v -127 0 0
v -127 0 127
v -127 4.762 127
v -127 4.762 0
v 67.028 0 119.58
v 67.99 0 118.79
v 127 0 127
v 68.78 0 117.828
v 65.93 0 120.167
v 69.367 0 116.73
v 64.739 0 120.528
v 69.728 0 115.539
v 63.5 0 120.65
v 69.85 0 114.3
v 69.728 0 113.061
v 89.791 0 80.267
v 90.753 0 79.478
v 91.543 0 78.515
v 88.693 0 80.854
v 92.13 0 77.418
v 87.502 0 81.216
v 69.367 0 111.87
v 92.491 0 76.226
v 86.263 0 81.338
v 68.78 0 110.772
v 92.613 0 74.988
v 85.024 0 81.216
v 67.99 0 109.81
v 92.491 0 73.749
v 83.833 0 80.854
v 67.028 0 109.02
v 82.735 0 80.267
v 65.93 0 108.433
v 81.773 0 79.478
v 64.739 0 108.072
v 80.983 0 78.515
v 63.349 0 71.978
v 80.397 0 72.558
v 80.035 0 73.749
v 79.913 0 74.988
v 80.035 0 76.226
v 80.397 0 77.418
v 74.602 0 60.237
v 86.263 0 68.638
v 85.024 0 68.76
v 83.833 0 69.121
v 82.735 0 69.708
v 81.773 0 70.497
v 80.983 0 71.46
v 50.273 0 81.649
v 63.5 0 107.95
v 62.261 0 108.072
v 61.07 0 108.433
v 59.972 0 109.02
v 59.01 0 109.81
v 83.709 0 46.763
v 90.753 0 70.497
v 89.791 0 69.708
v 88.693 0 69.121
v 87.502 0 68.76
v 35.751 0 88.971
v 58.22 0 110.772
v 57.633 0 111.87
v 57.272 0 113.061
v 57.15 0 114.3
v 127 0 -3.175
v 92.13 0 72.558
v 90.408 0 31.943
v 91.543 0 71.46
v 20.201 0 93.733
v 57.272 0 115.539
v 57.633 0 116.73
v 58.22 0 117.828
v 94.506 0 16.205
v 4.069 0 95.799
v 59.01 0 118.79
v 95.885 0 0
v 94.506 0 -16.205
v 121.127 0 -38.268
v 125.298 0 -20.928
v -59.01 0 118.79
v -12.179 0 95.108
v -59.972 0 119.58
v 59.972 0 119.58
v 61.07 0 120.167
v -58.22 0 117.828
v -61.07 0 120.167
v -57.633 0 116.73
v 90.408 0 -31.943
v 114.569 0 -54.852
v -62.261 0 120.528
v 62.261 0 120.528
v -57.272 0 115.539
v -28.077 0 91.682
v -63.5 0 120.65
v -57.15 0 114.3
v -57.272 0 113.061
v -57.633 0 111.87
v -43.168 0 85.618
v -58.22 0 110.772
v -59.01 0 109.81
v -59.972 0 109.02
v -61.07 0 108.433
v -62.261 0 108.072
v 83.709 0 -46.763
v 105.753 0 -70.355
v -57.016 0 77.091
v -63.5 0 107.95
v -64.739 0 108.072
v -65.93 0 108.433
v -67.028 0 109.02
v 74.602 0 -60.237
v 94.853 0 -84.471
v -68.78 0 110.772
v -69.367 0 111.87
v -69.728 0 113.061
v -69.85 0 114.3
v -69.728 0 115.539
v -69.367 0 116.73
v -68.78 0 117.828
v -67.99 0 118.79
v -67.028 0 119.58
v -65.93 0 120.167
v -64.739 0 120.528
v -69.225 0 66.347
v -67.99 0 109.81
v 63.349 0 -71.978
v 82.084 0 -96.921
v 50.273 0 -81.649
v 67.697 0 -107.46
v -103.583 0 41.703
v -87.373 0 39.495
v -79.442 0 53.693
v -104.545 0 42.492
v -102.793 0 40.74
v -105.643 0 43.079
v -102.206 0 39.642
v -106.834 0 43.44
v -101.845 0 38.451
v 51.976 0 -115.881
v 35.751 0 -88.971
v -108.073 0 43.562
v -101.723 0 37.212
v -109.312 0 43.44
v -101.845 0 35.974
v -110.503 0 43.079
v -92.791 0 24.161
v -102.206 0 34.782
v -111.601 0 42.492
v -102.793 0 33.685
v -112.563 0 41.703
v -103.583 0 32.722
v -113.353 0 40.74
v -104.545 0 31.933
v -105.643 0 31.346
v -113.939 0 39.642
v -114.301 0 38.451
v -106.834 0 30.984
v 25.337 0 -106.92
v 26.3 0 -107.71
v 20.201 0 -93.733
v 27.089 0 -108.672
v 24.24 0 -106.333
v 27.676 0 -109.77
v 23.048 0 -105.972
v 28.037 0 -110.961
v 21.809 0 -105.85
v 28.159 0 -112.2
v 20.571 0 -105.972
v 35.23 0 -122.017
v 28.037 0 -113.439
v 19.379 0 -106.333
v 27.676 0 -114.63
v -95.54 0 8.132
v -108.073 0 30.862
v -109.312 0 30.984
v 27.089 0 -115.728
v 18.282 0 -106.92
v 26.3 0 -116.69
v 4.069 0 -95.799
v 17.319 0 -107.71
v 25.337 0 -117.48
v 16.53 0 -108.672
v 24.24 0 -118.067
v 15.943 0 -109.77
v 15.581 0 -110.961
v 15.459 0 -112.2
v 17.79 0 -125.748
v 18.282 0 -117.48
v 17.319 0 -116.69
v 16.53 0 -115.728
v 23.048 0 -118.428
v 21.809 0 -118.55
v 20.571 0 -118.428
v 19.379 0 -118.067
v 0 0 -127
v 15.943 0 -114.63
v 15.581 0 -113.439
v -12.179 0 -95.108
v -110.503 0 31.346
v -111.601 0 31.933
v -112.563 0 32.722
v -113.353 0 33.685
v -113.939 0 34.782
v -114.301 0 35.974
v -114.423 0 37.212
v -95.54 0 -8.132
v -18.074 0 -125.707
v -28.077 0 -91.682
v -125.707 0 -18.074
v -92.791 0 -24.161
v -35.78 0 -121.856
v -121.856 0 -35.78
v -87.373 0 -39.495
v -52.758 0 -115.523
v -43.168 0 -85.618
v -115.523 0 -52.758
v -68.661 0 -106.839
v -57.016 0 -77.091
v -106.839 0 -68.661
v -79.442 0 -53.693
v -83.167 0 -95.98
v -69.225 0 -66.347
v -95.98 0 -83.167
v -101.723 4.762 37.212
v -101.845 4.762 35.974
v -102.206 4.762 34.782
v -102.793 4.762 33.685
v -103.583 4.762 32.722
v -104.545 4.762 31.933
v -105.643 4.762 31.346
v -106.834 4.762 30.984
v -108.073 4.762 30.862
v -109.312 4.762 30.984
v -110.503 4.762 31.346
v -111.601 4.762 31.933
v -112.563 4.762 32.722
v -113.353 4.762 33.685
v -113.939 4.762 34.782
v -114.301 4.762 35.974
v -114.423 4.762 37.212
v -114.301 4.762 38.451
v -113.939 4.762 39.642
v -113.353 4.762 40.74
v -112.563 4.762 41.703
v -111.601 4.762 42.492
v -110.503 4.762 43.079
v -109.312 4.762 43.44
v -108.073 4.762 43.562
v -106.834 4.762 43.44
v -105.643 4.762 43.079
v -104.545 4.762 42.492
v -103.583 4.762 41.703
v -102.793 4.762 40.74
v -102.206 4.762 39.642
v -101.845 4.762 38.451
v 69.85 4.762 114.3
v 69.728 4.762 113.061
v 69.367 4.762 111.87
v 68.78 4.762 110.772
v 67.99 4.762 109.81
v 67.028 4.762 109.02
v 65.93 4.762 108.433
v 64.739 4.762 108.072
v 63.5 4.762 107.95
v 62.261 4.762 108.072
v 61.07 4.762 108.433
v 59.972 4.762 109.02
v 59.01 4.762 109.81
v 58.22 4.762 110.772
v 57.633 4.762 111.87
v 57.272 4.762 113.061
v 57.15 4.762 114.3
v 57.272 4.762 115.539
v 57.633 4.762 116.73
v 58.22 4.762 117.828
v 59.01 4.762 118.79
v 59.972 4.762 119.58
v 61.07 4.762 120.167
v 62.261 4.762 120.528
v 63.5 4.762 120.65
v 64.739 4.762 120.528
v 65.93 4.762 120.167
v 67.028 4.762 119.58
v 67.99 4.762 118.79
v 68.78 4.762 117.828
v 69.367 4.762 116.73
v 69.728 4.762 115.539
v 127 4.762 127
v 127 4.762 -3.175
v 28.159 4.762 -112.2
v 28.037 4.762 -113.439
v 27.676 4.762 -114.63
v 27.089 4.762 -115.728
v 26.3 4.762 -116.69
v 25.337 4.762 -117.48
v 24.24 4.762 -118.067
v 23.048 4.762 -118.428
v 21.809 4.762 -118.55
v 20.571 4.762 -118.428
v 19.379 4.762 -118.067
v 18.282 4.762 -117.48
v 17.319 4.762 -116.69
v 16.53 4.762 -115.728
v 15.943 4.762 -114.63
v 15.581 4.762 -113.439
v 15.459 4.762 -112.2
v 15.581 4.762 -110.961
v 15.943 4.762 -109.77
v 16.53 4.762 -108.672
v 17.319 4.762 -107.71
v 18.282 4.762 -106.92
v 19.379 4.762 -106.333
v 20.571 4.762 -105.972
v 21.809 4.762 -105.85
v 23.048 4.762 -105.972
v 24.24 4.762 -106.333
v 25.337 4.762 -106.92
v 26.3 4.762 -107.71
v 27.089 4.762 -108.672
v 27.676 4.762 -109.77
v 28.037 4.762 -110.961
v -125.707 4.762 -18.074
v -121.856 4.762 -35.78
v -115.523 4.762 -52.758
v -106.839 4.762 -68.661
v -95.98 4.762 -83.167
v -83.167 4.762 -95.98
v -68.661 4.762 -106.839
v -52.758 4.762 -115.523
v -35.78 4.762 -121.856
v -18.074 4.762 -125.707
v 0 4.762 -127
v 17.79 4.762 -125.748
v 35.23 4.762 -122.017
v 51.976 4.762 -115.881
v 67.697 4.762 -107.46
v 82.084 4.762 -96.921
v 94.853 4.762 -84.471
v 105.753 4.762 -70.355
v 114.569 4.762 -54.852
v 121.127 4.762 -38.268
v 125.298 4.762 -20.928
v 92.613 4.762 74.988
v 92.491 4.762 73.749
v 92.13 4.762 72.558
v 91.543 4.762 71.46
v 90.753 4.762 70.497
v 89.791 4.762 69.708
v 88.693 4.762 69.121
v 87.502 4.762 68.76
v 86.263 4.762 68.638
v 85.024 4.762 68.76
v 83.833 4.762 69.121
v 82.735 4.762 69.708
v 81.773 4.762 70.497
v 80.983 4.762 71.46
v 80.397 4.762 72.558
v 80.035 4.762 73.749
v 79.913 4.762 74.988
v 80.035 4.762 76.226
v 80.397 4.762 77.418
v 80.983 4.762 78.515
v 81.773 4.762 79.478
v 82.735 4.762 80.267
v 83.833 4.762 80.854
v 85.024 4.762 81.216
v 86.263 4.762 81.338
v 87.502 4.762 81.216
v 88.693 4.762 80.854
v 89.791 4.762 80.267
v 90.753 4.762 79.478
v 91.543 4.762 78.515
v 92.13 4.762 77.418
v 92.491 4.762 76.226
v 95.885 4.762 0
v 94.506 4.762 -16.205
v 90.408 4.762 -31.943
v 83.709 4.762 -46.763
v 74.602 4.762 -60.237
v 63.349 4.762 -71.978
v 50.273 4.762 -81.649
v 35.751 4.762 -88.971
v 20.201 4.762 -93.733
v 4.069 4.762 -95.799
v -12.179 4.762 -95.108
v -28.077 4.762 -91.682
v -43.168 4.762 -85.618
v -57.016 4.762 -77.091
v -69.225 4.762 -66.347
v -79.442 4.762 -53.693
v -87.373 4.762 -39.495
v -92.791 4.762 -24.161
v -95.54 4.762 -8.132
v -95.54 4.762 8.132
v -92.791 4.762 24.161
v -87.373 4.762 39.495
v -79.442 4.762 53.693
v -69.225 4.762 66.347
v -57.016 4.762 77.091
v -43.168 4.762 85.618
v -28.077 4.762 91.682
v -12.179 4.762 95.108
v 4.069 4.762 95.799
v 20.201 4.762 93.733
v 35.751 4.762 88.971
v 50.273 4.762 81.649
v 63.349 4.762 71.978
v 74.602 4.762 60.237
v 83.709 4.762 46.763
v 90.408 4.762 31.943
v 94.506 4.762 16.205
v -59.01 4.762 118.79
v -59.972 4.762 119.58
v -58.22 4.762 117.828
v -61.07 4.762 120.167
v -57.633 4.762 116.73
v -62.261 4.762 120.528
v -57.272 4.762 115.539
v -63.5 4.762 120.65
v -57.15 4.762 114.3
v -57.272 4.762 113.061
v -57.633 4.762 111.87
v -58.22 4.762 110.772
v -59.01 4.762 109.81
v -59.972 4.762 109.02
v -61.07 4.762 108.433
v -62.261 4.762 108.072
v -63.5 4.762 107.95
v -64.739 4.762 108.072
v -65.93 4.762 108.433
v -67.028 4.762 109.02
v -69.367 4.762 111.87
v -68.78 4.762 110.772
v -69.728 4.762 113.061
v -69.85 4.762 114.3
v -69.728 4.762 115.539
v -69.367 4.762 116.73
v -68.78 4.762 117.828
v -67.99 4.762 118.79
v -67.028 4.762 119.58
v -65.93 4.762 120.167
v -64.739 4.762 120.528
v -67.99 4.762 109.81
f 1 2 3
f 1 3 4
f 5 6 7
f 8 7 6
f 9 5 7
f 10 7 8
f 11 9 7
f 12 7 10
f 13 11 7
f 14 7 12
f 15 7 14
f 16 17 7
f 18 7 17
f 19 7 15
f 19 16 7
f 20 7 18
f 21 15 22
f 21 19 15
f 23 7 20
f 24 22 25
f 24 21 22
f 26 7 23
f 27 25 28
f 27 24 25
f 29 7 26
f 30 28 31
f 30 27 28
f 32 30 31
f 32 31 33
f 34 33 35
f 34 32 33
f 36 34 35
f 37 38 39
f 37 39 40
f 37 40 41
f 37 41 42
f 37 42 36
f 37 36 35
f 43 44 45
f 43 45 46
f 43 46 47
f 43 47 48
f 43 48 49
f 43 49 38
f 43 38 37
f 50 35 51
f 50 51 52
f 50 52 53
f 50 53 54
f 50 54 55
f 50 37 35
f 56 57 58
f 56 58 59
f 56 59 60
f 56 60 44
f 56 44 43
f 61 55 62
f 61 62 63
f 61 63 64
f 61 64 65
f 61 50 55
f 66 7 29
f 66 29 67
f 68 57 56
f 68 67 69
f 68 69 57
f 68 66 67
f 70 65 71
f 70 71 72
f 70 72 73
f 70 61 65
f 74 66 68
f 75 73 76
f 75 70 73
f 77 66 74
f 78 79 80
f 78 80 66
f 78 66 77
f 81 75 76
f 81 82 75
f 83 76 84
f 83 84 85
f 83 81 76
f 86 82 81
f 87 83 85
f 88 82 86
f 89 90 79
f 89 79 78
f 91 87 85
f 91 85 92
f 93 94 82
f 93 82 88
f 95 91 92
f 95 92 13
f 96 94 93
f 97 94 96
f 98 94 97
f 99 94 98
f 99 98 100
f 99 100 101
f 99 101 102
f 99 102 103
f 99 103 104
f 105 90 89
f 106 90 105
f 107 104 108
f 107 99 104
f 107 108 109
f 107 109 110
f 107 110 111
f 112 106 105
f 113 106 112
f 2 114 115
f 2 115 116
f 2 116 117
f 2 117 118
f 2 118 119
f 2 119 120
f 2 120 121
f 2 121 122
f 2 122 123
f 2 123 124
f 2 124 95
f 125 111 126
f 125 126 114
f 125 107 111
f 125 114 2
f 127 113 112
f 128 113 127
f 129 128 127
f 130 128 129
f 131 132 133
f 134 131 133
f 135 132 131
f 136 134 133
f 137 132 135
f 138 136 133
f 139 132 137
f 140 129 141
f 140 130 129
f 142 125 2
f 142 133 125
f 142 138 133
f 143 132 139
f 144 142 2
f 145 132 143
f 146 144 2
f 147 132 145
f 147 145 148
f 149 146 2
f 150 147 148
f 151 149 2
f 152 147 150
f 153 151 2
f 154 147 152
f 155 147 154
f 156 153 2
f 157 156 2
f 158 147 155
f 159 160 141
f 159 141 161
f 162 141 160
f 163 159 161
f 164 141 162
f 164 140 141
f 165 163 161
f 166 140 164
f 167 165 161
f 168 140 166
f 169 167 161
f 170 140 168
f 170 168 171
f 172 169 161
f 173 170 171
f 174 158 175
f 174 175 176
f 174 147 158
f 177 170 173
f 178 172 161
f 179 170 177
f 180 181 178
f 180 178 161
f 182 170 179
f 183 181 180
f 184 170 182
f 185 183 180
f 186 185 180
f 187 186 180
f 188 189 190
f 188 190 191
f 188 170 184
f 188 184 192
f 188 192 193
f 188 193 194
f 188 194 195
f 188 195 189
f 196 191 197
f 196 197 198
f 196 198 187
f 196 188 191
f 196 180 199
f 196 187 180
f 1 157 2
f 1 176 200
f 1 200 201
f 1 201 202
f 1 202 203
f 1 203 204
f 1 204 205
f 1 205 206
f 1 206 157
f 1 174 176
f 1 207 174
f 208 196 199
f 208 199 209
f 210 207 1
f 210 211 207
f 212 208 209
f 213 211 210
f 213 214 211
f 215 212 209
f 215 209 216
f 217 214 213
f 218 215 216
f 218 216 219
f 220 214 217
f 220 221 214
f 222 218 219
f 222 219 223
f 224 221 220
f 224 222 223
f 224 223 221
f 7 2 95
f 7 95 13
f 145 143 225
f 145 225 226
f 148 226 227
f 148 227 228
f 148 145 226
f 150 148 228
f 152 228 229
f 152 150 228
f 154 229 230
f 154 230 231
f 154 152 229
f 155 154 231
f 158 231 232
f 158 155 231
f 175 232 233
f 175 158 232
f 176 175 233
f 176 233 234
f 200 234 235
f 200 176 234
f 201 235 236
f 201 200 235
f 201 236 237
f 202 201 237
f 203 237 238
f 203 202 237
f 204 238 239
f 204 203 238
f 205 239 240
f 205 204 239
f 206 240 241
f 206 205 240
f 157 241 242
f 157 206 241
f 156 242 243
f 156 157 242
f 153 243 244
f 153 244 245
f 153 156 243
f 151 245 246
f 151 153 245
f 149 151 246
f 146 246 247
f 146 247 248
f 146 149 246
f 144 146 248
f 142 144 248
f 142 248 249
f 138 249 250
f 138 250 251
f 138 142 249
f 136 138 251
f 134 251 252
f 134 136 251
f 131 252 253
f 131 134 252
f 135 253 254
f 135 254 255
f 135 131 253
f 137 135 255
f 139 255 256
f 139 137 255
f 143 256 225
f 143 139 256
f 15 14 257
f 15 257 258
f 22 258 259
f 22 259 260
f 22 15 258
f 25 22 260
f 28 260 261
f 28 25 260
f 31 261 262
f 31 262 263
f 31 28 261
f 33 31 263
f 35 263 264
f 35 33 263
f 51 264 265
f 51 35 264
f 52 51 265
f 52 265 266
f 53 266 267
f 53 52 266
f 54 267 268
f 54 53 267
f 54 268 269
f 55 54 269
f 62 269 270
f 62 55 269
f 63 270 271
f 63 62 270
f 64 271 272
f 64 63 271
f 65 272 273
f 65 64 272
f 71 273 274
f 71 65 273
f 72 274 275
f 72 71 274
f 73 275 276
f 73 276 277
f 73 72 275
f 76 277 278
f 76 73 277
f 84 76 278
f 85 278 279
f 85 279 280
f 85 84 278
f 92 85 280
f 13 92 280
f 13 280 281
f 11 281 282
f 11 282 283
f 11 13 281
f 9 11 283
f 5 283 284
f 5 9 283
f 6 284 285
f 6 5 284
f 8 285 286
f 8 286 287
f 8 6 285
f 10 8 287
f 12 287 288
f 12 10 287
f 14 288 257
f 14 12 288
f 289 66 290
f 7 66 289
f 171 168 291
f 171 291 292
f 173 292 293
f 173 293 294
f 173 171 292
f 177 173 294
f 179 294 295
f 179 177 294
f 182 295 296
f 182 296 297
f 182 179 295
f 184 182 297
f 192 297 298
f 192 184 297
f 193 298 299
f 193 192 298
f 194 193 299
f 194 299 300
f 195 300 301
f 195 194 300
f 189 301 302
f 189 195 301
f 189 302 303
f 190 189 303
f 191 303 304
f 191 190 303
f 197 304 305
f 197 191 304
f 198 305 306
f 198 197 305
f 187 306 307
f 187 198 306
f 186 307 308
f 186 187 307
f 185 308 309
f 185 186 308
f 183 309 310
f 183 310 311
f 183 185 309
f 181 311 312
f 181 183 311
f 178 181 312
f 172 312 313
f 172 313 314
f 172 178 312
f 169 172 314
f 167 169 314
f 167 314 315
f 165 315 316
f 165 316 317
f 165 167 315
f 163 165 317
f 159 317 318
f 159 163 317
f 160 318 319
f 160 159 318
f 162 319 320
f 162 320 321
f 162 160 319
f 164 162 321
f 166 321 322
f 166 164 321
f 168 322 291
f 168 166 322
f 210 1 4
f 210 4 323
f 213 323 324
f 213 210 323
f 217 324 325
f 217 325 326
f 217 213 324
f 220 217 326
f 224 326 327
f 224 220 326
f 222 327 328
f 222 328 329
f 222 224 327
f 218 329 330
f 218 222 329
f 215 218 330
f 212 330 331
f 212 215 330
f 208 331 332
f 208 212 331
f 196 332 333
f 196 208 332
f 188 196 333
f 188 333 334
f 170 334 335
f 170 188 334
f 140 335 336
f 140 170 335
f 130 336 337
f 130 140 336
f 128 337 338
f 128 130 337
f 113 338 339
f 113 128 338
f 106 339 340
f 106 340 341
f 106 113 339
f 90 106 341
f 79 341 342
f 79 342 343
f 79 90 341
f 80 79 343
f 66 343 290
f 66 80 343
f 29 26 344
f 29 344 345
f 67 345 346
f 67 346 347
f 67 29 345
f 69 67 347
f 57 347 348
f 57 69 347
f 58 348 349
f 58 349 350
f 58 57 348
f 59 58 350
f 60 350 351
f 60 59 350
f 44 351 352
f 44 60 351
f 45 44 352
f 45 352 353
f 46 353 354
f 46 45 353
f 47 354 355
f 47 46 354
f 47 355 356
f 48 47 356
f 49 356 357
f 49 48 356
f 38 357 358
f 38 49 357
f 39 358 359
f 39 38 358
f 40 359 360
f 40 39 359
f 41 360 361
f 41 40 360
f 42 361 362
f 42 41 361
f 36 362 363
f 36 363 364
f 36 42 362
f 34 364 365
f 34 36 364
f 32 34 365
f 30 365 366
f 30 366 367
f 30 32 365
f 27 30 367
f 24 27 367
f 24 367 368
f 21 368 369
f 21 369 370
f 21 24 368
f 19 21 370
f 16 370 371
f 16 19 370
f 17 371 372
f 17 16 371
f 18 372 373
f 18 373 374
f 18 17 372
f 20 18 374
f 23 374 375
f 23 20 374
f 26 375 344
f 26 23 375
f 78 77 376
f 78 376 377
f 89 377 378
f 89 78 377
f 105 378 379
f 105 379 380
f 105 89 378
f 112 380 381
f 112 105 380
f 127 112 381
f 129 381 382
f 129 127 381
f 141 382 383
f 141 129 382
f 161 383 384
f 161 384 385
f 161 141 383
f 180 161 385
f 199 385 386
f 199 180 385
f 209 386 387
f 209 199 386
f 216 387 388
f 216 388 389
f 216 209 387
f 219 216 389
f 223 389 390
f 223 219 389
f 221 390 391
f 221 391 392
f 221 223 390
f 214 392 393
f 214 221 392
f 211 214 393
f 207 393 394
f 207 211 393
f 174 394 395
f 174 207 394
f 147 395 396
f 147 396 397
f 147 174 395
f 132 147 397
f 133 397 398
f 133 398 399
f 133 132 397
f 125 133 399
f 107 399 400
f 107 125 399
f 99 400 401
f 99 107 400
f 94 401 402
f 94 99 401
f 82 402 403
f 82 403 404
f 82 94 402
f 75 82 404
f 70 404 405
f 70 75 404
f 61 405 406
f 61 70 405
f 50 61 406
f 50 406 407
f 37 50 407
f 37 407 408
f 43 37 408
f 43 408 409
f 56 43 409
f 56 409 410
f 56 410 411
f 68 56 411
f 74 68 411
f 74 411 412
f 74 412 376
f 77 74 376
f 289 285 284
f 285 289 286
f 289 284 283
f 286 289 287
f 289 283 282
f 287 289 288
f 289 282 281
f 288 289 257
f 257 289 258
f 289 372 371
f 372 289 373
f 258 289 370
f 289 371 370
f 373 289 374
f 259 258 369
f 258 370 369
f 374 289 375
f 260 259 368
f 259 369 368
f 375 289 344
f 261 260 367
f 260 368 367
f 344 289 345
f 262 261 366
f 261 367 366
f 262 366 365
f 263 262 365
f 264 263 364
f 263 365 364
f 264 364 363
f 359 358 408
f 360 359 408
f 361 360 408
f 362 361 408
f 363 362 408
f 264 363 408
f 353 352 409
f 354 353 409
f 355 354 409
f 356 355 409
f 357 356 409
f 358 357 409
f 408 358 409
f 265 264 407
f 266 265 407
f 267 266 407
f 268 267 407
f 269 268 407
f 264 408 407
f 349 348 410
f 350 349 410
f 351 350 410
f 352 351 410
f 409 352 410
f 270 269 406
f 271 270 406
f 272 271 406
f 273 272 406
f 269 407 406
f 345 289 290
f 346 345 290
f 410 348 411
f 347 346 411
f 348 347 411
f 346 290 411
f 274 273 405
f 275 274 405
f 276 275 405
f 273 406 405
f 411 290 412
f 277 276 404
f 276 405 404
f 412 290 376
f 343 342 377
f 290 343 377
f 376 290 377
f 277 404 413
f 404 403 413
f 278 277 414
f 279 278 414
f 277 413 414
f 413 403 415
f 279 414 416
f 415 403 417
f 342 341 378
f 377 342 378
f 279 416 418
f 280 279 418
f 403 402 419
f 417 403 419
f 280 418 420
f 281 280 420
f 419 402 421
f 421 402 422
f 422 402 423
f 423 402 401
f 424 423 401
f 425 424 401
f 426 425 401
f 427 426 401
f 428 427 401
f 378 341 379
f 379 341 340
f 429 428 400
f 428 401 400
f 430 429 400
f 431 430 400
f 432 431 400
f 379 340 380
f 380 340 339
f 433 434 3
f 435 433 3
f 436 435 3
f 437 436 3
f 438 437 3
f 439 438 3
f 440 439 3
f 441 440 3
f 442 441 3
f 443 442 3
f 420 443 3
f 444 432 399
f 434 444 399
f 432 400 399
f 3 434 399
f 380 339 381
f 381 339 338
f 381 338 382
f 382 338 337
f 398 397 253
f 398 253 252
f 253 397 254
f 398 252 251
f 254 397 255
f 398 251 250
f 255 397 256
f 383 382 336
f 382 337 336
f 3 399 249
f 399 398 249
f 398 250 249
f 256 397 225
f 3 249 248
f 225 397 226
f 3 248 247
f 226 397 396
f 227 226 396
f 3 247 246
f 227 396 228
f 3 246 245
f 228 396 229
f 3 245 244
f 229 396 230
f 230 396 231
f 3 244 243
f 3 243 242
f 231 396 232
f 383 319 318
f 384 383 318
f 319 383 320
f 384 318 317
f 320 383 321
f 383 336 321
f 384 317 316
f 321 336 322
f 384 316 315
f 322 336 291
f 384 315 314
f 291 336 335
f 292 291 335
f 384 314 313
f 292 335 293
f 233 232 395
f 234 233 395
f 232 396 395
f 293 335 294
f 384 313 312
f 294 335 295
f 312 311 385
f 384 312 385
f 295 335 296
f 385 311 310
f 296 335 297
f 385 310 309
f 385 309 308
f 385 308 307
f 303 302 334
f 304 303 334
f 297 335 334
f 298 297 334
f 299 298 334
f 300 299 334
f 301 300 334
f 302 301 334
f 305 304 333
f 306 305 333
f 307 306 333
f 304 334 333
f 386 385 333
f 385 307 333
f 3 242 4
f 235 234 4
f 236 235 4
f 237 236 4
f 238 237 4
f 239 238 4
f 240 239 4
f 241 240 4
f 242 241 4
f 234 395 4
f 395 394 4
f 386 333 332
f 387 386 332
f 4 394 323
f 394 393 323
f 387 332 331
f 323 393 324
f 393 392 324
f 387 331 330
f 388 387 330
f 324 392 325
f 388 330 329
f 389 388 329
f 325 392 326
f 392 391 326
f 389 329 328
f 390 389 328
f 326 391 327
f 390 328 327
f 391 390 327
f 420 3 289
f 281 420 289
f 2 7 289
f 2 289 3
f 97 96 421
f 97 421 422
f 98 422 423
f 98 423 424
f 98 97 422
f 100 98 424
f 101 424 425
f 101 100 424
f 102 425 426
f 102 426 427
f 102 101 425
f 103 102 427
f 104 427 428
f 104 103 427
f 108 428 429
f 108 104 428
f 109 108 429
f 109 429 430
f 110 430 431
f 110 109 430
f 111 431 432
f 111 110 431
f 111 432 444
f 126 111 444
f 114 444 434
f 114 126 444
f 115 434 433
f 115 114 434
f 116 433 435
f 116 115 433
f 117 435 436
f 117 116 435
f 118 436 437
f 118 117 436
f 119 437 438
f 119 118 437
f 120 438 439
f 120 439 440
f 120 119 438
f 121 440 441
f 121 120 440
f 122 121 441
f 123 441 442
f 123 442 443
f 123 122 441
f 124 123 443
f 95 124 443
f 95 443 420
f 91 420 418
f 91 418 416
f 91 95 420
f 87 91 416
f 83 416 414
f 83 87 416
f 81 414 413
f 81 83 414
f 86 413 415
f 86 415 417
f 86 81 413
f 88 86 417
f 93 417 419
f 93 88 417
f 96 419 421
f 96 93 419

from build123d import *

# Parameters (mm, degrees)
SKETCH1_R           = 95.885
SKETCH1_R_2         = 6.35
BOSS_EXTRUDE1_DEPTH = 4.7625


with BuildPart() as part:
    # Sketch1 → Boss-Extrude1 (new body)
    with BuildSketch(Plane(origin=(0, 0, 0), x_dir=(1, 0, 0), z_dir=(0, 1, 0))):
        with BuildLine():
            Line((127, -127), (-127, -127))
            Line((-127, -127), (-127, 0))
            ThreePointArc((-127, 0), (-89.802561208, 89.802561213), (7e-09, 127))
            ThreePointArc((7e-09, 127), (88.687133546, 90.920457479), (127, 3.175))
            Line((127, 3.175), (127, -127))
        make_face()
        Circle(SKETCH1_R, mode=Mode.SUBTRACT)
        with Locations((-108.072773191, -37.212440054)):
            Circle(SKETCH1_R_2, mode=Mode.SUBTRACT)
        with Locations((21.809468172, 112.199987068)):
            Circle(SKETCH1_R_2, mode=Mode.SUBTRACT)
        with Locations((86.263305019, -74.987547014)):
            Circle(SKETCH1_R_2, mode=Mode.SUBTRACT)
        with Locations((-63.5, -114.3)):
            Circle(SKETCH1_R_2, mode=Mode.SUBTRACT)
        with Locations((63.5, -114.3)):
            Circle(SKETCH1_R_2, mode=Mode.SUBTRACT)
    extrude(amount=BOSS_EXTRUDE1_DEPTH)


solid = part.part
